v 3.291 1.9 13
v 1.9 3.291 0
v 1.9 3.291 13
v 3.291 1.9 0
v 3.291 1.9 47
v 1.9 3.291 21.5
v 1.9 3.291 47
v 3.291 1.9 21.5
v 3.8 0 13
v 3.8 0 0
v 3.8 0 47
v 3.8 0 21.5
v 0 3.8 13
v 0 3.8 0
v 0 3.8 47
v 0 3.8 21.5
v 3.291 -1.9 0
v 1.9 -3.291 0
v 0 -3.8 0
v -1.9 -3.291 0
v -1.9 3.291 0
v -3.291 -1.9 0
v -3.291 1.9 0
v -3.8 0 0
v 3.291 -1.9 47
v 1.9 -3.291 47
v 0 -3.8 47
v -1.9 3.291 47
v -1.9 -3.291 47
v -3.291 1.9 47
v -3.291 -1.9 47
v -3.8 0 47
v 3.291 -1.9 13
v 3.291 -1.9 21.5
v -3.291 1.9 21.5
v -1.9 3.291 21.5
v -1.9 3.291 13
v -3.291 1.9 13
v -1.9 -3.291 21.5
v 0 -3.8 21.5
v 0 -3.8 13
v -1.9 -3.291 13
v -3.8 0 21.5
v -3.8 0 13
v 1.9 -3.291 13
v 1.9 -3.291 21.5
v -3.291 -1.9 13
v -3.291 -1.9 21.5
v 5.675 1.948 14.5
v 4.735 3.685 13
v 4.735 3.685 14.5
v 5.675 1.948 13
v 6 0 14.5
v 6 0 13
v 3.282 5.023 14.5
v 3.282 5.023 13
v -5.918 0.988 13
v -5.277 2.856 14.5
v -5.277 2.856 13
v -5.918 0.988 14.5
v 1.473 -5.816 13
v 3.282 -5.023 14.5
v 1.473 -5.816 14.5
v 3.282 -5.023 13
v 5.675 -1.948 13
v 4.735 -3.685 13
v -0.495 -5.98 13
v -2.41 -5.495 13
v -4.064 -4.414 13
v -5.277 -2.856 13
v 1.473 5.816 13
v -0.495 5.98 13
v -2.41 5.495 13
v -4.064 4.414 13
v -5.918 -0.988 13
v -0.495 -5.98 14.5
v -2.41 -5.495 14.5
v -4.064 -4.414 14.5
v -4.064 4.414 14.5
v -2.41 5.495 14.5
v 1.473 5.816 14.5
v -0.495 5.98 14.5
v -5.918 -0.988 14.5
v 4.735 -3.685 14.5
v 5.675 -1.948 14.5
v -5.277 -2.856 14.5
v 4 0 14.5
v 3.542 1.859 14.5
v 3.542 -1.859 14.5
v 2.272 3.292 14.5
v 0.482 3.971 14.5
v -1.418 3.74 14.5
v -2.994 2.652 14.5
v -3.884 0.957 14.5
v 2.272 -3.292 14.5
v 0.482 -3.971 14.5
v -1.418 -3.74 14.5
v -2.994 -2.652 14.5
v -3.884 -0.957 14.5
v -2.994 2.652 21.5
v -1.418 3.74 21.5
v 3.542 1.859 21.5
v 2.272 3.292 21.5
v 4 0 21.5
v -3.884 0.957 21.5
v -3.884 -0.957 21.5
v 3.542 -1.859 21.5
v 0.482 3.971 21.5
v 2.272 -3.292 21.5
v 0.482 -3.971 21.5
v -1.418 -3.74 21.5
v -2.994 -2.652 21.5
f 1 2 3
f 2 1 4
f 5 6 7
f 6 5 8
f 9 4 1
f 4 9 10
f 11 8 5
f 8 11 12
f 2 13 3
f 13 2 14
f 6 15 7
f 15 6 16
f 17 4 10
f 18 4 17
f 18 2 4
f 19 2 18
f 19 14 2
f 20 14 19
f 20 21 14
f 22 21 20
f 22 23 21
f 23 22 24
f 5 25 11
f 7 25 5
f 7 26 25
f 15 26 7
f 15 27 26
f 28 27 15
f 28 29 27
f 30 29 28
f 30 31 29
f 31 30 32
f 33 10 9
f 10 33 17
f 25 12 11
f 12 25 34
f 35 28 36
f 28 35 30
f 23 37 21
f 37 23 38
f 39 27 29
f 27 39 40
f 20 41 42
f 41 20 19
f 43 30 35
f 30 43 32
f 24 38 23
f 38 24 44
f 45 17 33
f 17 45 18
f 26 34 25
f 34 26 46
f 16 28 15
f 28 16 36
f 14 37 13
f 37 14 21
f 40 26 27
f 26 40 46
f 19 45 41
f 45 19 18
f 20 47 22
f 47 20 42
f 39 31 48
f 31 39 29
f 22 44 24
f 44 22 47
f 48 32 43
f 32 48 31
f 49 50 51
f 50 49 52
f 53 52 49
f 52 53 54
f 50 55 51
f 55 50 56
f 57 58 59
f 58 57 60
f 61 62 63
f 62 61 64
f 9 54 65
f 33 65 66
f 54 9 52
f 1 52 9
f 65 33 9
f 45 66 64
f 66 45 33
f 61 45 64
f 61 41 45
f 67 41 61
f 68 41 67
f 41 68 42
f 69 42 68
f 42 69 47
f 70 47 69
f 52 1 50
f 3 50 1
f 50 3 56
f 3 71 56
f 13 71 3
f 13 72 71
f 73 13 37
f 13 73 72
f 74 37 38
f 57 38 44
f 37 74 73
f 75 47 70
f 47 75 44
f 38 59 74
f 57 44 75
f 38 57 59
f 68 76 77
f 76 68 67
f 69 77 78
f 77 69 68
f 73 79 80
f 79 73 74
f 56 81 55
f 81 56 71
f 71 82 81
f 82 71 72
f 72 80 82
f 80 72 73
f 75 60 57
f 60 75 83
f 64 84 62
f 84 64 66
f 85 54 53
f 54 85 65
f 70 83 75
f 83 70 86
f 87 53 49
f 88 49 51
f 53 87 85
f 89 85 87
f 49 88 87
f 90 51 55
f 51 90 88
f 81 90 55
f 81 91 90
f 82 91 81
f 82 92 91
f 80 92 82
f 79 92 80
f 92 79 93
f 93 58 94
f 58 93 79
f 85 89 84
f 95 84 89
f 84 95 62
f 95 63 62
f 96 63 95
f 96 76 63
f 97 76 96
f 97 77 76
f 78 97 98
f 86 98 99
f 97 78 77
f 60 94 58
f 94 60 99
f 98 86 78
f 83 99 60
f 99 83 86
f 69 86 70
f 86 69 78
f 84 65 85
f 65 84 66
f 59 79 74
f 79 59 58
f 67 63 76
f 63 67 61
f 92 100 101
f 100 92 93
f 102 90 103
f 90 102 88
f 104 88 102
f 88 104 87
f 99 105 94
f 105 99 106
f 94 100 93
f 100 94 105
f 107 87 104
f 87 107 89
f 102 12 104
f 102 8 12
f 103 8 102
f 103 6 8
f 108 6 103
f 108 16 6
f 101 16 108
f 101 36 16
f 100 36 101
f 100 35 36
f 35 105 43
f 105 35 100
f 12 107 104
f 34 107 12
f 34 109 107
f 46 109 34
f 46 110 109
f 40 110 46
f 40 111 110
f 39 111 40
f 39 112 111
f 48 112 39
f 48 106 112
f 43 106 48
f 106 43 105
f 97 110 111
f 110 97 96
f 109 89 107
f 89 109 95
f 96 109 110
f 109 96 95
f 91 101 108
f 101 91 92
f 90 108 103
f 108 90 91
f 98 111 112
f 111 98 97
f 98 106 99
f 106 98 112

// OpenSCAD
module axle_old() {
    color("DarkGoldenrod",0.7) union() {
        // main body
        cylinder(h=47, r=4);
        // spacer
        translate([0,0,12+1]) cylinder(h=1.5, r=6);
    }
}

module axle() {
    color("DarkGoldenrod",0.7) union() {
        // main body
        cylinder(h=47, r=4-0.2);
        // spacer
        translate([0,0,12+1]) cylinder(h=1.5, r=6);
        // friction fit onto bearing
        translate([0,0,14.5]) cylinder(h=7, r=4);
    }
}

axle();
